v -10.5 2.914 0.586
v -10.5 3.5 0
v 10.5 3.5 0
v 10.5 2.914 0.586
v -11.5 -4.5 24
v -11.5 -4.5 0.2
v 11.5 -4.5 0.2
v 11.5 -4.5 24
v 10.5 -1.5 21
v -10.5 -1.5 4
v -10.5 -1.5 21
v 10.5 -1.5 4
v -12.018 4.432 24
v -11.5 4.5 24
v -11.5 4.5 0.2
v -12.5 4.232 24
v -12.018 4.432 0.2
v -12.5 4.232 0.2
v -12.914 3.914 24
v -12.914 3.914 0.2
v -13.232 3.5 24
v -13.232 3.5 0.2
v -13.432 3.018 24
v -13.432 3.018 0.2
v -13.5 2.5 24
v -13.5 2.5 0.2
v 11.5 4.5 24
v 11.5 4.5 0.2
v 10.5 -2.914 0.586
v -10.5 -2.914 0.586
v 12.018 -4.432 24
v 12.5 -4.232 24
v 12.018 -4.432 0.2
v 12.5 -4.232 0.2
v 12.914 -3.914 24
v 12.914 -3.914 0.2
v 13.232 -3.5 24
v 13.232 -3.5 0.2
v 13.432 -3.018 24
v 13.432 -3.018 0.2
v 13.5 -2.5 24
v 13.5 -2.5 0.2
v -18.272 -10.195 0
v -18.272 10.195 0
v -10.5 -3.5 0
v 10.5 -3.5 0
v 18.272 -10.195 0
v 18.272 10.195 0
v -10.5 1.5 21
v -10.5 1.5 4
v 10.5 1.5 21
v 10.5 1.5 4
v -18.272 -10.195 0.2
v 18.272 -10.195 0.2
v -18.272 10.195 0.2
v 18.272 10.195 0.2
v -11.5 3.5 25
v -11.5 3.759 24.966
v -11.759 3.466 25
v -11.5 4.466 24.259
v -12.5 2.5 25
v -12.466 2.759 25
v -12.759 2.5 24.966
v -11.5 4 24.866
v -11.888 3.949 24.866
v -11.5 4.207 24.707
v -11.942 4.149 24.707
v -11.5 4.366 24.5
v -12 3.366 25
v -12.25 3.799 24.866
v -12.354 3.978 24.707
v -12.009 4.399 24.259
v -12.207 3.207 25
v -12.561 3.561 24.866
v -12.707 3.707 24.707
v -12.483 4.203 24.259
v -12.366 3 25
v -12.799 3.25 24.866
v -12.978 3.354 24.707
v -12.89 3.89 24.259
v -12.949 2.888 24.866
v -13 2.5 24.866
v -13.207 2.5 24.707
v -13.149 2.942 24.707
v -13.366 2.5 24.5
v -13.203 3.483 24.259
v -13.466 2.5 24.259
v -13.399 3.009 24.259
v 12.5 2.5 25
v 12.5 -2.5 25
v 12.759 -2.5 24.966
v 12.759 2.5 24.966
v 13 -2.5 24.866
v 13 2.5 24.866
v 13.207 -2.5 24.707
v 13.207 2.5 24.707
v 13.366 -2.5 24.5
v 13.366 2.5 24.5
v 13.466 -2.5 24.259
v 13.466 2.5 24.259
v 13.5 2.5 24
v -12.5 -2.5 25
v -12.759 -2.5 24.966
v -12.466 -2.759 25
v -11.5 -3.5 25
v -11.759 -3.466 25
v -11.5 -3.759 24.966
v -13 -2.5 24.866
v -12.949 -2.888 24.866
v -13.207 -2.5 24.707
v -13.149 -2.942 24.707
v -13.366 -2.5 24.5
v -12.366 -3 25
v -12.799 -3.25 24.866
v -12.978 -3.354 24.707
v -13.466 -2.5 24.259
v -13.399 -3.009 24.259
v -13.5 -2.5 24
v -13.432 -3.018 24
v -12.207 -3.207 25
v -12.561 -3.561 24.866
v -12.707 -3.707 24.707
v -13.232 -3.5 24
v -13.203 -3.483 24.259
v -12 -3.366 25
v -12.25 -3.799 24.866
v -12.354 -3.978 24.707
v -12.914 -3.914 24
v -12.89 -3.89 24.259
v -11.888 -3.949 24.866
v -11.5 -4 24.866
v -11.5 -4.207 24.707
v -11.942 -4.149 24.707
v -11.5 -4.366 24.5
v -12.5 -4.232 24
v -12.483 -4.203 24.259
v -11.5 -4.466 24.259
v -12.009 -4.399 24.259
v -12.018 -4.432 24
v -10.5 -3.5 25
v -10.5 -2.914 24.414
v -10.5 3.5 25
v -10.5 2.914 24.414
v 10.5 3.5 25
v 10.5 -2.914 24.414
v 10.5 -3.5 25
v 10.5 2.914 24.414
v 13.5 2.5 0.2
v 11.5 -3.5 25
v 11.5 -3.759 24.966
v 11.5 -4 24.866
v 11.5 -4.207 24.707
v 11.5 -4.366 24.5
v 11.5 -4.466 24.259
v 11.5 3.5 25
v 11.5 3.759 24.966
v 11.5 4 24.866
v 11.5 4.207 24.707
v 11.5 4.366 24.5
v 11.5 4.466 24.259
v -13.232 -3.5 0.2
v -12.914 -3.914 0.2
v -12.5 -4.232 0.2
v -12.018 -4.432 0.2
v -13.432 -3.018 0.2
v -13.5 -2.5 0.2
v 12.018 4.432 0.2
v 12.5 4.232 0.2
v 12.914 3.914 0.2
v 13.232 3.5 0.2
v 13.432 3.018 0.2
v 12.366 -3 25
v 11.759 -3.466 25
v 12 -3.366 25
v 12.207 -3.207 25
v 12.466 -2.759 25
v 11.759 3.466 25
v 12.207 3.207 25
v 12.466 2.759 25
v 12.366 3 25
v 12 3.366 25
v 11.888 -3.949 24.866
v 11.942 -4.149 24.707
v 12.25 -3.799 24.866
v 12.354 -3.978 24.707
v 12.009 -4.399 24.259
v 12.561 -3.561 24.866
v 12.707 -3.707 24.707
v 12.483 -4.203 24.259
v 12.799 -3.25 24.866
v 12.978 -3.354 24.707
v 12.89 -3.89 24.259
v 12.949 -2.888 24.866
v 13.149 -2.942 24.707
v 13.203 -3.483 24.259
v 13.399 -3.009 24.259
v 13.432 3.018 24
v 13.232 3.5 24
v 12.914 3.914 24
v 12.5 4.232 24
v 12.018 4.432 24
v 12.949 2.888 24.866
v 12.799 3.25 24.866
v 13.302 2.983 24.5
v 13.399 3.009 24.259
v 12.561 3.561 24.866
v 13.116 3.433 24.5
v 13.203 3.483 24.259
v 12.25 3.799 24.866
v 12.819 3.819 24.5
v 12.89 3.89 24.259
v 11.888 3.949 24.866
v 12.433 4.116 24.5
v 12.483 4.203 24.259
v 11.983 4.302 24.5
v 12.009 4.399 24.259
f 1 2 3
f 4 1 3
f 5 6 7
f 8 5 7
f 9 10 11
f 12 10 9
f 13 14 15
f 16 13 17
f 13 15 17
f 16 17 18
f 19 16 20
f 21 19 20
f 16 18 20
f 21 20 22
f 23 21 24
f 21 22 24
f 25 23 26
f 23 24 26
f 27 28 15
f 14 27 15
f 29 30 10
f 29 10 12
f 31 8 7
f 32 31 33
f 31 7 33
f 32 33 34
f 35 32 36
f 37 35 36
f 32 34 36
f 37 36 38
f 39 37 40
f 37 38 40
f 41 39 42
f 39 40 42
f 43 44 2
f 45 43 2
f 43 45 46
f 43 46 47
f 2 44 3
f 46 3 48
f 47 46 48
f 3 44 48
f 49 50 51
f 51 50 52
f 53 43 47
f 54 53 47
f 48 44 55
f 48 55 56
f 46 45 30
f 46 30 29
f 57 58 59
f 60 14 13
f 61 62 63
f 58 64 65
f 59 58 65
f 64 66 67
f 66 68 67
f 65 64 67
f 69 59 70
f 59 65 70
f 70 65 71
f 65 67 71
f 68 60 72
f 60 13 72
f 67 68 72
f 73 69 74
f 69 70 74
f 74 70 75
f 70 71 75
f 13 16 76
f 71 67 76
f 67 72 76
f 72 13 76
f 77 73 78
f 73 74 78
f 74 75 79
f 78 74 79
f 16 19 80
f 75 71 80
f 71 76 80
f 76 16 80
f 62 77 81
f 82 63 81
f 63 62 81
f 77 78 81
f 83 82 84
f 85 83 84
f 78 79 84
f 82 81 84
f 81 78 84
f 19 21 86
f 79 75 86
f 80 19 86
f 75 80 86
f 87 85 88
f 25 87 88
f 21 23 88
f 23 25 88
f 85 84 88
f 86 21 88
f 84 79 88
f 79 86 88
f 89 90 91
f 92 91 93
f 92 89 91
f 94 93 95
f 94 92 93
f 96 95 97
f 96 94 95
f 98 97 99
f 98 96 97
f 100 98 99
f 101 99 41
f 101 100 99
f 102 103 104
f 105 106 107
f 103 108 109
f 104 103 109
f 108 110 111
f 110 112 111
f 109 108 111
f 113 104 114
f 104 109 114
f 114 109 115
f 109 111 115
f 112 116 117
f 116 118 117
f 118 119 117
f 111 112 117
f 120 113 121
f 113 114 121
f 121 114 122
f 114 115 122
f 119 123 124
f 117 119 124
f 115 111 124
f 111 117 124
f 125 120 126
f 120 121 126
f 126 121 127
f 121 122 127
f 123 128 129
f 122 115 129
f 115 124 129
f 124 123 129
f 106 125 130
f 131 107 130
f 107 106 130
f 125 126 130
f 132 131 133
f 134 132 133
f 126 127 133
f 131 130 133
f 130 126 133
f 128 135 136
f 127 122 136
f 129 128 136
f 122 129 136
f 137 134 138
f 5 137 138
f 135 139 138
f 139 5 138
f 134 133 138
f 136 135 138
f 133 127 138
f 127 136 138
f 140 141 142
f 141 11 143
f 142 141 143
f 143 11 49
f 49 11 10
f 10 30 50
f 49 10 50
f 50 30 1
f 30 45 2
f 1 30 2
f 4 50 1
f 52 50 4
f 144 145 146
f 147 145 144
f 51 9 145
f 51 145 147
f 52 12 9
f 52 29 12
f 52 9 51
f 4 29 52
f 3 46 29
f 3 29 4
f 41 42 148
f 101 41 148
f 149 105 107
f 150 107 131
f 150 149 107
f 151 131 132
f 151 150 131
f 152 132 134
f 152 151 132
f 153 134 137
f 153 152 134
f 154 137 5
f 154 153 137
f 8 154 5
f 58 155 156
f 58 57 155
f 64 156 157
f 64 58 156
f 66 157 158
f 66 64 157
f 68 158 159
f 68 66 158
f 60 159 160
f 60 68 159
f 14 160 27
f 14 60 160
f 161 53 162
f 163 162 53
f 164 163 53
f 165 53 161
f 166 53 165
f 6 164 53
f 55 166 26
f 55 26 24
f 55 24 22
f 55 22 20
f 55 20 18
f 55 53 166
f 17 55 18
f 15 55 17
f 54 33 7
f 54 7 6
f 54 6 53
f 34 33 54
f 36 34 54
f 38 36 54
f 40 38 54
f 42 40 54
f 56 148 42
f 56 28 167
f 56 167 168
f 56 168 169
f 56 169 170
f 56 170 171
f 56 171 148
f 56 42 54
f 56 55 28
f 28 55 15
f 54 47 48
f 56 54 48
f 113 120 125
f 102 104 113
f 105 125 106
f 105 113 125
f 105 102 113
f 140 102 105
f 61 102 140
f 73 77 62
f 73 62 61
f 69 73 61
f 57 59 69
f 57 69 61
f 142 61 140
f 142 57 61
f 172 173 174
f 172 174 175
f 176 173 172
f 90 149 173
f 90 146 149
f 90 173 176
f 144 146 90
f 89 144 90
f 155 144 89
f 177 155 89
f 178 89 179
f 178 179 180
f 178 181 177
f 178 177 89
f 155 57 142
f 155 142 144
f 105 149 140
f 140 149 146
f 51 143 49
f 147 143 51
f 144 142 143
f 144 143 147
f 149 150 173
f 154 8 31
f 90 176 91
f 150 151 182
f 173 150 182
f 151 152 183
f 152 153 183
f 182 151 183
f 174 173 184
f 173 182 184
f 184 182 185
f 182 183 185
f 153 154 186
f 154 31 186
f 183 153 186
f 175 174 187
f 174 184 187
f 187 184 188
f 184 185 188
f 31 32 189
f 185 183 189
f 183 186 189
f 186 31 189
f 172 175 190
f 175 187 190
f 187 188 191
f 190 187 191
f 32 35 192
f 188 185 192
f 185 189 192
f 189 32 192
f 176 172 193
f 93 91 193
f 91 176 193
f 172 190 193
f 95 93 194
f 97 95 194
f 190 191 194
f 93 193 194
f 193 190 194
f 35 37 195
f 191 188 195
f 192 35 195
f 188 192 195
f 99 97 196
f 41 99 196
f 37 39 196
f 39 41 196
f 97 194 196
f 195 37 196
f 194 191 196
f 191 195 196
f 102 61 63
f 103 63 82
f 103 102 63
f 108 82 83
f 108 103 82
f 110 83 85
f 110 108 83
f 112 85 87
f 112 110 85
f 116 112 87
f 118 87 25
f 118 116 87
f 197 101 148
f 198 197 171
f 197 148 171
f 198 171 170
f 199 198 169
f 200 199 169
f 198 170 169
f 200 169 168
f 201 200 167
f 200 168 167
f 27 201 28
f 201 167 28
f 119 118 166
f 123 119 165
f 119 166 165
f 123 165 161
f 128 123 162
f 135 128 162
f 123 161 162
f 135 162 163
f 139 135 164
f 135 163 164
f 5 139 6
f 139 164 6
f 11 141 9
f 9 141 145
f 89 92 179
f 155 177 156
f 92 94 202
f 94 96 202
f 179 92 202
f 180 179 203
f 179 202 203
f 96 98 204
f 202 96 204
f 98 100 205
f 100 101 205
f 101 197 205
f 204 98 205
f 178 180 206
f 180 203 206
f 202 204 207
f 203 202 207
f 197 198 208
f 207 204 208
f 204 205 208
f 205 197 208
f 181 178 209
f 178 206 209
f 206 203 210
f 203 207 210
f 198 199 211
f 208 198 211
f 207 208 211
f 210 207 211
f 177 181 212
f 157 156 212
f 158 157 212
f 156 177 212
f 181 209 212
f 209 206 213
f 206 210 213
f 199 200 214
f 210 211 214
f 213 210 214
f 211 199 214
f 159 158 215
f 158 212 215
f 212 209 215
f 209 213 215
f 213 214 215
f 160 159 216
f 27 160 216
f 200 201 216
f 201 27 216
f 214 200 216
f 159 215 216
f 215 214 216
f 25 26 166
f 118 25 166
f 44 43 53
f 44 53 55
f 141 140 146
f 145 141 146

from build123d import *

# Parameters (mm, degrees)
F0_W     = 21
F0_H     = 3
F1_DEPTH = 25
F2_SIZE  = 2
F3_SIZE  = 2
F4_R     = 0.99999
F0_W_2   = 36.543905735
F0_H_2   = 20.3890502453
F5_DEPTH = 0.2


# Not quite as in the source:
# - a fillet or chamfer is up to 0.001 mm smaller than in the source, because OpenCascade refuses the exact size


with BuildPart() as f1:
    # F0 (on Top) → F1 (new body)
    with BuildSketch(Plane.XY):
        with BuildLine():
            Line((-11.5, -4.5), (11.5, -4.5))
            ThreePointArc((11.5, -4.5), (12.9142135624, -3.9142135624), (13.5, -2.5))
            Line((13.5, -2.5), (13.5, 2.5))
            ThreePointArc((13.5, 2.5), (12.9142135624, 3.9142135624), (11.5, 4.5))
            Line((11.5, 4.5), (-11.5, 4.5))
            ThreePointArc((-11.5, 4.5), (-12.9142135624, 3.9142135624), (-13.5, 2.5))
            Line((-13.5, 2.5), (-13.5, -2.5))
            ThreePointArc((-13.5, -2.5), (-12.9142135624, -3.9142135624), (-11.5, -4.5))
        make_face()
        Rectangle(F0_W, F0_H, mode=Mode.SUBTRACT)
    extrude(amount=F1_DEPTH)

    # F2
    f2_edges = [f1.edges().sort_by_distance(p)[0] for p in [
        (0, -1.5, 25),
        (0, 1.5, 25),
        (0, 1.5, 0),
        (0, -1.5, 0),
    ]]
    chamfer(f2_edges, length=F2_SIZE)

    # F3
    f3_edges = [f1.edges().sort_by_distance(p)[0] for p in [
        (0, 1.5, 23),
        (0, -1.5, 23),
        (0, -1.5, 2),
        (0, 1.5, 2),
    ]]
    chamfer(f3_edges, length=F3_SIZE)

    # F4 (radius 1 in the source; OpenCascade refuses exactly that, so slightly less here)
    f4_edges = [f1.edges().sort_by_distance(p)[0] for p in [
        (0, 4.5, 25),
    ]]
    fillet(f4_edges, radius=F4_R)

    # F0 (on Top) → F5 (join)
    with BuildSketch(Plane.XY):
        Rectangle(F0_W_2, F0_H_2)
        with BuildLine():
            ThreePointArc((13.5, -2.5), (12.9142135624, -3.9142135624), (11.5, -4.5))
            Line((11.5, -4.5), (-11.5, -4.5))
            ThreePointArc((-11.5, -4.5), (-12.9142135624, -3.9142135624), (-13.5, -2.5))
            Line((-13.5, -2.5), (-13.5, 2.5))
            ThreePointArc((-13.5, 2.5), (-12.9142135624, 3.9142135624), (-11.5, 4.5))
            Line((-11.5, 4.5), (11.5, 4.5))
            ThreePointArc((11.5, 4.5), (12.9142135624, 3.9142135624), (13.5, 2.5))
            Line((13.5, 2.5), (13.5, -2.5))
        make_face(mode=Mode.SUBTRACT)
    extrude(amount=F5_DEPTH)


solid = f1.part
